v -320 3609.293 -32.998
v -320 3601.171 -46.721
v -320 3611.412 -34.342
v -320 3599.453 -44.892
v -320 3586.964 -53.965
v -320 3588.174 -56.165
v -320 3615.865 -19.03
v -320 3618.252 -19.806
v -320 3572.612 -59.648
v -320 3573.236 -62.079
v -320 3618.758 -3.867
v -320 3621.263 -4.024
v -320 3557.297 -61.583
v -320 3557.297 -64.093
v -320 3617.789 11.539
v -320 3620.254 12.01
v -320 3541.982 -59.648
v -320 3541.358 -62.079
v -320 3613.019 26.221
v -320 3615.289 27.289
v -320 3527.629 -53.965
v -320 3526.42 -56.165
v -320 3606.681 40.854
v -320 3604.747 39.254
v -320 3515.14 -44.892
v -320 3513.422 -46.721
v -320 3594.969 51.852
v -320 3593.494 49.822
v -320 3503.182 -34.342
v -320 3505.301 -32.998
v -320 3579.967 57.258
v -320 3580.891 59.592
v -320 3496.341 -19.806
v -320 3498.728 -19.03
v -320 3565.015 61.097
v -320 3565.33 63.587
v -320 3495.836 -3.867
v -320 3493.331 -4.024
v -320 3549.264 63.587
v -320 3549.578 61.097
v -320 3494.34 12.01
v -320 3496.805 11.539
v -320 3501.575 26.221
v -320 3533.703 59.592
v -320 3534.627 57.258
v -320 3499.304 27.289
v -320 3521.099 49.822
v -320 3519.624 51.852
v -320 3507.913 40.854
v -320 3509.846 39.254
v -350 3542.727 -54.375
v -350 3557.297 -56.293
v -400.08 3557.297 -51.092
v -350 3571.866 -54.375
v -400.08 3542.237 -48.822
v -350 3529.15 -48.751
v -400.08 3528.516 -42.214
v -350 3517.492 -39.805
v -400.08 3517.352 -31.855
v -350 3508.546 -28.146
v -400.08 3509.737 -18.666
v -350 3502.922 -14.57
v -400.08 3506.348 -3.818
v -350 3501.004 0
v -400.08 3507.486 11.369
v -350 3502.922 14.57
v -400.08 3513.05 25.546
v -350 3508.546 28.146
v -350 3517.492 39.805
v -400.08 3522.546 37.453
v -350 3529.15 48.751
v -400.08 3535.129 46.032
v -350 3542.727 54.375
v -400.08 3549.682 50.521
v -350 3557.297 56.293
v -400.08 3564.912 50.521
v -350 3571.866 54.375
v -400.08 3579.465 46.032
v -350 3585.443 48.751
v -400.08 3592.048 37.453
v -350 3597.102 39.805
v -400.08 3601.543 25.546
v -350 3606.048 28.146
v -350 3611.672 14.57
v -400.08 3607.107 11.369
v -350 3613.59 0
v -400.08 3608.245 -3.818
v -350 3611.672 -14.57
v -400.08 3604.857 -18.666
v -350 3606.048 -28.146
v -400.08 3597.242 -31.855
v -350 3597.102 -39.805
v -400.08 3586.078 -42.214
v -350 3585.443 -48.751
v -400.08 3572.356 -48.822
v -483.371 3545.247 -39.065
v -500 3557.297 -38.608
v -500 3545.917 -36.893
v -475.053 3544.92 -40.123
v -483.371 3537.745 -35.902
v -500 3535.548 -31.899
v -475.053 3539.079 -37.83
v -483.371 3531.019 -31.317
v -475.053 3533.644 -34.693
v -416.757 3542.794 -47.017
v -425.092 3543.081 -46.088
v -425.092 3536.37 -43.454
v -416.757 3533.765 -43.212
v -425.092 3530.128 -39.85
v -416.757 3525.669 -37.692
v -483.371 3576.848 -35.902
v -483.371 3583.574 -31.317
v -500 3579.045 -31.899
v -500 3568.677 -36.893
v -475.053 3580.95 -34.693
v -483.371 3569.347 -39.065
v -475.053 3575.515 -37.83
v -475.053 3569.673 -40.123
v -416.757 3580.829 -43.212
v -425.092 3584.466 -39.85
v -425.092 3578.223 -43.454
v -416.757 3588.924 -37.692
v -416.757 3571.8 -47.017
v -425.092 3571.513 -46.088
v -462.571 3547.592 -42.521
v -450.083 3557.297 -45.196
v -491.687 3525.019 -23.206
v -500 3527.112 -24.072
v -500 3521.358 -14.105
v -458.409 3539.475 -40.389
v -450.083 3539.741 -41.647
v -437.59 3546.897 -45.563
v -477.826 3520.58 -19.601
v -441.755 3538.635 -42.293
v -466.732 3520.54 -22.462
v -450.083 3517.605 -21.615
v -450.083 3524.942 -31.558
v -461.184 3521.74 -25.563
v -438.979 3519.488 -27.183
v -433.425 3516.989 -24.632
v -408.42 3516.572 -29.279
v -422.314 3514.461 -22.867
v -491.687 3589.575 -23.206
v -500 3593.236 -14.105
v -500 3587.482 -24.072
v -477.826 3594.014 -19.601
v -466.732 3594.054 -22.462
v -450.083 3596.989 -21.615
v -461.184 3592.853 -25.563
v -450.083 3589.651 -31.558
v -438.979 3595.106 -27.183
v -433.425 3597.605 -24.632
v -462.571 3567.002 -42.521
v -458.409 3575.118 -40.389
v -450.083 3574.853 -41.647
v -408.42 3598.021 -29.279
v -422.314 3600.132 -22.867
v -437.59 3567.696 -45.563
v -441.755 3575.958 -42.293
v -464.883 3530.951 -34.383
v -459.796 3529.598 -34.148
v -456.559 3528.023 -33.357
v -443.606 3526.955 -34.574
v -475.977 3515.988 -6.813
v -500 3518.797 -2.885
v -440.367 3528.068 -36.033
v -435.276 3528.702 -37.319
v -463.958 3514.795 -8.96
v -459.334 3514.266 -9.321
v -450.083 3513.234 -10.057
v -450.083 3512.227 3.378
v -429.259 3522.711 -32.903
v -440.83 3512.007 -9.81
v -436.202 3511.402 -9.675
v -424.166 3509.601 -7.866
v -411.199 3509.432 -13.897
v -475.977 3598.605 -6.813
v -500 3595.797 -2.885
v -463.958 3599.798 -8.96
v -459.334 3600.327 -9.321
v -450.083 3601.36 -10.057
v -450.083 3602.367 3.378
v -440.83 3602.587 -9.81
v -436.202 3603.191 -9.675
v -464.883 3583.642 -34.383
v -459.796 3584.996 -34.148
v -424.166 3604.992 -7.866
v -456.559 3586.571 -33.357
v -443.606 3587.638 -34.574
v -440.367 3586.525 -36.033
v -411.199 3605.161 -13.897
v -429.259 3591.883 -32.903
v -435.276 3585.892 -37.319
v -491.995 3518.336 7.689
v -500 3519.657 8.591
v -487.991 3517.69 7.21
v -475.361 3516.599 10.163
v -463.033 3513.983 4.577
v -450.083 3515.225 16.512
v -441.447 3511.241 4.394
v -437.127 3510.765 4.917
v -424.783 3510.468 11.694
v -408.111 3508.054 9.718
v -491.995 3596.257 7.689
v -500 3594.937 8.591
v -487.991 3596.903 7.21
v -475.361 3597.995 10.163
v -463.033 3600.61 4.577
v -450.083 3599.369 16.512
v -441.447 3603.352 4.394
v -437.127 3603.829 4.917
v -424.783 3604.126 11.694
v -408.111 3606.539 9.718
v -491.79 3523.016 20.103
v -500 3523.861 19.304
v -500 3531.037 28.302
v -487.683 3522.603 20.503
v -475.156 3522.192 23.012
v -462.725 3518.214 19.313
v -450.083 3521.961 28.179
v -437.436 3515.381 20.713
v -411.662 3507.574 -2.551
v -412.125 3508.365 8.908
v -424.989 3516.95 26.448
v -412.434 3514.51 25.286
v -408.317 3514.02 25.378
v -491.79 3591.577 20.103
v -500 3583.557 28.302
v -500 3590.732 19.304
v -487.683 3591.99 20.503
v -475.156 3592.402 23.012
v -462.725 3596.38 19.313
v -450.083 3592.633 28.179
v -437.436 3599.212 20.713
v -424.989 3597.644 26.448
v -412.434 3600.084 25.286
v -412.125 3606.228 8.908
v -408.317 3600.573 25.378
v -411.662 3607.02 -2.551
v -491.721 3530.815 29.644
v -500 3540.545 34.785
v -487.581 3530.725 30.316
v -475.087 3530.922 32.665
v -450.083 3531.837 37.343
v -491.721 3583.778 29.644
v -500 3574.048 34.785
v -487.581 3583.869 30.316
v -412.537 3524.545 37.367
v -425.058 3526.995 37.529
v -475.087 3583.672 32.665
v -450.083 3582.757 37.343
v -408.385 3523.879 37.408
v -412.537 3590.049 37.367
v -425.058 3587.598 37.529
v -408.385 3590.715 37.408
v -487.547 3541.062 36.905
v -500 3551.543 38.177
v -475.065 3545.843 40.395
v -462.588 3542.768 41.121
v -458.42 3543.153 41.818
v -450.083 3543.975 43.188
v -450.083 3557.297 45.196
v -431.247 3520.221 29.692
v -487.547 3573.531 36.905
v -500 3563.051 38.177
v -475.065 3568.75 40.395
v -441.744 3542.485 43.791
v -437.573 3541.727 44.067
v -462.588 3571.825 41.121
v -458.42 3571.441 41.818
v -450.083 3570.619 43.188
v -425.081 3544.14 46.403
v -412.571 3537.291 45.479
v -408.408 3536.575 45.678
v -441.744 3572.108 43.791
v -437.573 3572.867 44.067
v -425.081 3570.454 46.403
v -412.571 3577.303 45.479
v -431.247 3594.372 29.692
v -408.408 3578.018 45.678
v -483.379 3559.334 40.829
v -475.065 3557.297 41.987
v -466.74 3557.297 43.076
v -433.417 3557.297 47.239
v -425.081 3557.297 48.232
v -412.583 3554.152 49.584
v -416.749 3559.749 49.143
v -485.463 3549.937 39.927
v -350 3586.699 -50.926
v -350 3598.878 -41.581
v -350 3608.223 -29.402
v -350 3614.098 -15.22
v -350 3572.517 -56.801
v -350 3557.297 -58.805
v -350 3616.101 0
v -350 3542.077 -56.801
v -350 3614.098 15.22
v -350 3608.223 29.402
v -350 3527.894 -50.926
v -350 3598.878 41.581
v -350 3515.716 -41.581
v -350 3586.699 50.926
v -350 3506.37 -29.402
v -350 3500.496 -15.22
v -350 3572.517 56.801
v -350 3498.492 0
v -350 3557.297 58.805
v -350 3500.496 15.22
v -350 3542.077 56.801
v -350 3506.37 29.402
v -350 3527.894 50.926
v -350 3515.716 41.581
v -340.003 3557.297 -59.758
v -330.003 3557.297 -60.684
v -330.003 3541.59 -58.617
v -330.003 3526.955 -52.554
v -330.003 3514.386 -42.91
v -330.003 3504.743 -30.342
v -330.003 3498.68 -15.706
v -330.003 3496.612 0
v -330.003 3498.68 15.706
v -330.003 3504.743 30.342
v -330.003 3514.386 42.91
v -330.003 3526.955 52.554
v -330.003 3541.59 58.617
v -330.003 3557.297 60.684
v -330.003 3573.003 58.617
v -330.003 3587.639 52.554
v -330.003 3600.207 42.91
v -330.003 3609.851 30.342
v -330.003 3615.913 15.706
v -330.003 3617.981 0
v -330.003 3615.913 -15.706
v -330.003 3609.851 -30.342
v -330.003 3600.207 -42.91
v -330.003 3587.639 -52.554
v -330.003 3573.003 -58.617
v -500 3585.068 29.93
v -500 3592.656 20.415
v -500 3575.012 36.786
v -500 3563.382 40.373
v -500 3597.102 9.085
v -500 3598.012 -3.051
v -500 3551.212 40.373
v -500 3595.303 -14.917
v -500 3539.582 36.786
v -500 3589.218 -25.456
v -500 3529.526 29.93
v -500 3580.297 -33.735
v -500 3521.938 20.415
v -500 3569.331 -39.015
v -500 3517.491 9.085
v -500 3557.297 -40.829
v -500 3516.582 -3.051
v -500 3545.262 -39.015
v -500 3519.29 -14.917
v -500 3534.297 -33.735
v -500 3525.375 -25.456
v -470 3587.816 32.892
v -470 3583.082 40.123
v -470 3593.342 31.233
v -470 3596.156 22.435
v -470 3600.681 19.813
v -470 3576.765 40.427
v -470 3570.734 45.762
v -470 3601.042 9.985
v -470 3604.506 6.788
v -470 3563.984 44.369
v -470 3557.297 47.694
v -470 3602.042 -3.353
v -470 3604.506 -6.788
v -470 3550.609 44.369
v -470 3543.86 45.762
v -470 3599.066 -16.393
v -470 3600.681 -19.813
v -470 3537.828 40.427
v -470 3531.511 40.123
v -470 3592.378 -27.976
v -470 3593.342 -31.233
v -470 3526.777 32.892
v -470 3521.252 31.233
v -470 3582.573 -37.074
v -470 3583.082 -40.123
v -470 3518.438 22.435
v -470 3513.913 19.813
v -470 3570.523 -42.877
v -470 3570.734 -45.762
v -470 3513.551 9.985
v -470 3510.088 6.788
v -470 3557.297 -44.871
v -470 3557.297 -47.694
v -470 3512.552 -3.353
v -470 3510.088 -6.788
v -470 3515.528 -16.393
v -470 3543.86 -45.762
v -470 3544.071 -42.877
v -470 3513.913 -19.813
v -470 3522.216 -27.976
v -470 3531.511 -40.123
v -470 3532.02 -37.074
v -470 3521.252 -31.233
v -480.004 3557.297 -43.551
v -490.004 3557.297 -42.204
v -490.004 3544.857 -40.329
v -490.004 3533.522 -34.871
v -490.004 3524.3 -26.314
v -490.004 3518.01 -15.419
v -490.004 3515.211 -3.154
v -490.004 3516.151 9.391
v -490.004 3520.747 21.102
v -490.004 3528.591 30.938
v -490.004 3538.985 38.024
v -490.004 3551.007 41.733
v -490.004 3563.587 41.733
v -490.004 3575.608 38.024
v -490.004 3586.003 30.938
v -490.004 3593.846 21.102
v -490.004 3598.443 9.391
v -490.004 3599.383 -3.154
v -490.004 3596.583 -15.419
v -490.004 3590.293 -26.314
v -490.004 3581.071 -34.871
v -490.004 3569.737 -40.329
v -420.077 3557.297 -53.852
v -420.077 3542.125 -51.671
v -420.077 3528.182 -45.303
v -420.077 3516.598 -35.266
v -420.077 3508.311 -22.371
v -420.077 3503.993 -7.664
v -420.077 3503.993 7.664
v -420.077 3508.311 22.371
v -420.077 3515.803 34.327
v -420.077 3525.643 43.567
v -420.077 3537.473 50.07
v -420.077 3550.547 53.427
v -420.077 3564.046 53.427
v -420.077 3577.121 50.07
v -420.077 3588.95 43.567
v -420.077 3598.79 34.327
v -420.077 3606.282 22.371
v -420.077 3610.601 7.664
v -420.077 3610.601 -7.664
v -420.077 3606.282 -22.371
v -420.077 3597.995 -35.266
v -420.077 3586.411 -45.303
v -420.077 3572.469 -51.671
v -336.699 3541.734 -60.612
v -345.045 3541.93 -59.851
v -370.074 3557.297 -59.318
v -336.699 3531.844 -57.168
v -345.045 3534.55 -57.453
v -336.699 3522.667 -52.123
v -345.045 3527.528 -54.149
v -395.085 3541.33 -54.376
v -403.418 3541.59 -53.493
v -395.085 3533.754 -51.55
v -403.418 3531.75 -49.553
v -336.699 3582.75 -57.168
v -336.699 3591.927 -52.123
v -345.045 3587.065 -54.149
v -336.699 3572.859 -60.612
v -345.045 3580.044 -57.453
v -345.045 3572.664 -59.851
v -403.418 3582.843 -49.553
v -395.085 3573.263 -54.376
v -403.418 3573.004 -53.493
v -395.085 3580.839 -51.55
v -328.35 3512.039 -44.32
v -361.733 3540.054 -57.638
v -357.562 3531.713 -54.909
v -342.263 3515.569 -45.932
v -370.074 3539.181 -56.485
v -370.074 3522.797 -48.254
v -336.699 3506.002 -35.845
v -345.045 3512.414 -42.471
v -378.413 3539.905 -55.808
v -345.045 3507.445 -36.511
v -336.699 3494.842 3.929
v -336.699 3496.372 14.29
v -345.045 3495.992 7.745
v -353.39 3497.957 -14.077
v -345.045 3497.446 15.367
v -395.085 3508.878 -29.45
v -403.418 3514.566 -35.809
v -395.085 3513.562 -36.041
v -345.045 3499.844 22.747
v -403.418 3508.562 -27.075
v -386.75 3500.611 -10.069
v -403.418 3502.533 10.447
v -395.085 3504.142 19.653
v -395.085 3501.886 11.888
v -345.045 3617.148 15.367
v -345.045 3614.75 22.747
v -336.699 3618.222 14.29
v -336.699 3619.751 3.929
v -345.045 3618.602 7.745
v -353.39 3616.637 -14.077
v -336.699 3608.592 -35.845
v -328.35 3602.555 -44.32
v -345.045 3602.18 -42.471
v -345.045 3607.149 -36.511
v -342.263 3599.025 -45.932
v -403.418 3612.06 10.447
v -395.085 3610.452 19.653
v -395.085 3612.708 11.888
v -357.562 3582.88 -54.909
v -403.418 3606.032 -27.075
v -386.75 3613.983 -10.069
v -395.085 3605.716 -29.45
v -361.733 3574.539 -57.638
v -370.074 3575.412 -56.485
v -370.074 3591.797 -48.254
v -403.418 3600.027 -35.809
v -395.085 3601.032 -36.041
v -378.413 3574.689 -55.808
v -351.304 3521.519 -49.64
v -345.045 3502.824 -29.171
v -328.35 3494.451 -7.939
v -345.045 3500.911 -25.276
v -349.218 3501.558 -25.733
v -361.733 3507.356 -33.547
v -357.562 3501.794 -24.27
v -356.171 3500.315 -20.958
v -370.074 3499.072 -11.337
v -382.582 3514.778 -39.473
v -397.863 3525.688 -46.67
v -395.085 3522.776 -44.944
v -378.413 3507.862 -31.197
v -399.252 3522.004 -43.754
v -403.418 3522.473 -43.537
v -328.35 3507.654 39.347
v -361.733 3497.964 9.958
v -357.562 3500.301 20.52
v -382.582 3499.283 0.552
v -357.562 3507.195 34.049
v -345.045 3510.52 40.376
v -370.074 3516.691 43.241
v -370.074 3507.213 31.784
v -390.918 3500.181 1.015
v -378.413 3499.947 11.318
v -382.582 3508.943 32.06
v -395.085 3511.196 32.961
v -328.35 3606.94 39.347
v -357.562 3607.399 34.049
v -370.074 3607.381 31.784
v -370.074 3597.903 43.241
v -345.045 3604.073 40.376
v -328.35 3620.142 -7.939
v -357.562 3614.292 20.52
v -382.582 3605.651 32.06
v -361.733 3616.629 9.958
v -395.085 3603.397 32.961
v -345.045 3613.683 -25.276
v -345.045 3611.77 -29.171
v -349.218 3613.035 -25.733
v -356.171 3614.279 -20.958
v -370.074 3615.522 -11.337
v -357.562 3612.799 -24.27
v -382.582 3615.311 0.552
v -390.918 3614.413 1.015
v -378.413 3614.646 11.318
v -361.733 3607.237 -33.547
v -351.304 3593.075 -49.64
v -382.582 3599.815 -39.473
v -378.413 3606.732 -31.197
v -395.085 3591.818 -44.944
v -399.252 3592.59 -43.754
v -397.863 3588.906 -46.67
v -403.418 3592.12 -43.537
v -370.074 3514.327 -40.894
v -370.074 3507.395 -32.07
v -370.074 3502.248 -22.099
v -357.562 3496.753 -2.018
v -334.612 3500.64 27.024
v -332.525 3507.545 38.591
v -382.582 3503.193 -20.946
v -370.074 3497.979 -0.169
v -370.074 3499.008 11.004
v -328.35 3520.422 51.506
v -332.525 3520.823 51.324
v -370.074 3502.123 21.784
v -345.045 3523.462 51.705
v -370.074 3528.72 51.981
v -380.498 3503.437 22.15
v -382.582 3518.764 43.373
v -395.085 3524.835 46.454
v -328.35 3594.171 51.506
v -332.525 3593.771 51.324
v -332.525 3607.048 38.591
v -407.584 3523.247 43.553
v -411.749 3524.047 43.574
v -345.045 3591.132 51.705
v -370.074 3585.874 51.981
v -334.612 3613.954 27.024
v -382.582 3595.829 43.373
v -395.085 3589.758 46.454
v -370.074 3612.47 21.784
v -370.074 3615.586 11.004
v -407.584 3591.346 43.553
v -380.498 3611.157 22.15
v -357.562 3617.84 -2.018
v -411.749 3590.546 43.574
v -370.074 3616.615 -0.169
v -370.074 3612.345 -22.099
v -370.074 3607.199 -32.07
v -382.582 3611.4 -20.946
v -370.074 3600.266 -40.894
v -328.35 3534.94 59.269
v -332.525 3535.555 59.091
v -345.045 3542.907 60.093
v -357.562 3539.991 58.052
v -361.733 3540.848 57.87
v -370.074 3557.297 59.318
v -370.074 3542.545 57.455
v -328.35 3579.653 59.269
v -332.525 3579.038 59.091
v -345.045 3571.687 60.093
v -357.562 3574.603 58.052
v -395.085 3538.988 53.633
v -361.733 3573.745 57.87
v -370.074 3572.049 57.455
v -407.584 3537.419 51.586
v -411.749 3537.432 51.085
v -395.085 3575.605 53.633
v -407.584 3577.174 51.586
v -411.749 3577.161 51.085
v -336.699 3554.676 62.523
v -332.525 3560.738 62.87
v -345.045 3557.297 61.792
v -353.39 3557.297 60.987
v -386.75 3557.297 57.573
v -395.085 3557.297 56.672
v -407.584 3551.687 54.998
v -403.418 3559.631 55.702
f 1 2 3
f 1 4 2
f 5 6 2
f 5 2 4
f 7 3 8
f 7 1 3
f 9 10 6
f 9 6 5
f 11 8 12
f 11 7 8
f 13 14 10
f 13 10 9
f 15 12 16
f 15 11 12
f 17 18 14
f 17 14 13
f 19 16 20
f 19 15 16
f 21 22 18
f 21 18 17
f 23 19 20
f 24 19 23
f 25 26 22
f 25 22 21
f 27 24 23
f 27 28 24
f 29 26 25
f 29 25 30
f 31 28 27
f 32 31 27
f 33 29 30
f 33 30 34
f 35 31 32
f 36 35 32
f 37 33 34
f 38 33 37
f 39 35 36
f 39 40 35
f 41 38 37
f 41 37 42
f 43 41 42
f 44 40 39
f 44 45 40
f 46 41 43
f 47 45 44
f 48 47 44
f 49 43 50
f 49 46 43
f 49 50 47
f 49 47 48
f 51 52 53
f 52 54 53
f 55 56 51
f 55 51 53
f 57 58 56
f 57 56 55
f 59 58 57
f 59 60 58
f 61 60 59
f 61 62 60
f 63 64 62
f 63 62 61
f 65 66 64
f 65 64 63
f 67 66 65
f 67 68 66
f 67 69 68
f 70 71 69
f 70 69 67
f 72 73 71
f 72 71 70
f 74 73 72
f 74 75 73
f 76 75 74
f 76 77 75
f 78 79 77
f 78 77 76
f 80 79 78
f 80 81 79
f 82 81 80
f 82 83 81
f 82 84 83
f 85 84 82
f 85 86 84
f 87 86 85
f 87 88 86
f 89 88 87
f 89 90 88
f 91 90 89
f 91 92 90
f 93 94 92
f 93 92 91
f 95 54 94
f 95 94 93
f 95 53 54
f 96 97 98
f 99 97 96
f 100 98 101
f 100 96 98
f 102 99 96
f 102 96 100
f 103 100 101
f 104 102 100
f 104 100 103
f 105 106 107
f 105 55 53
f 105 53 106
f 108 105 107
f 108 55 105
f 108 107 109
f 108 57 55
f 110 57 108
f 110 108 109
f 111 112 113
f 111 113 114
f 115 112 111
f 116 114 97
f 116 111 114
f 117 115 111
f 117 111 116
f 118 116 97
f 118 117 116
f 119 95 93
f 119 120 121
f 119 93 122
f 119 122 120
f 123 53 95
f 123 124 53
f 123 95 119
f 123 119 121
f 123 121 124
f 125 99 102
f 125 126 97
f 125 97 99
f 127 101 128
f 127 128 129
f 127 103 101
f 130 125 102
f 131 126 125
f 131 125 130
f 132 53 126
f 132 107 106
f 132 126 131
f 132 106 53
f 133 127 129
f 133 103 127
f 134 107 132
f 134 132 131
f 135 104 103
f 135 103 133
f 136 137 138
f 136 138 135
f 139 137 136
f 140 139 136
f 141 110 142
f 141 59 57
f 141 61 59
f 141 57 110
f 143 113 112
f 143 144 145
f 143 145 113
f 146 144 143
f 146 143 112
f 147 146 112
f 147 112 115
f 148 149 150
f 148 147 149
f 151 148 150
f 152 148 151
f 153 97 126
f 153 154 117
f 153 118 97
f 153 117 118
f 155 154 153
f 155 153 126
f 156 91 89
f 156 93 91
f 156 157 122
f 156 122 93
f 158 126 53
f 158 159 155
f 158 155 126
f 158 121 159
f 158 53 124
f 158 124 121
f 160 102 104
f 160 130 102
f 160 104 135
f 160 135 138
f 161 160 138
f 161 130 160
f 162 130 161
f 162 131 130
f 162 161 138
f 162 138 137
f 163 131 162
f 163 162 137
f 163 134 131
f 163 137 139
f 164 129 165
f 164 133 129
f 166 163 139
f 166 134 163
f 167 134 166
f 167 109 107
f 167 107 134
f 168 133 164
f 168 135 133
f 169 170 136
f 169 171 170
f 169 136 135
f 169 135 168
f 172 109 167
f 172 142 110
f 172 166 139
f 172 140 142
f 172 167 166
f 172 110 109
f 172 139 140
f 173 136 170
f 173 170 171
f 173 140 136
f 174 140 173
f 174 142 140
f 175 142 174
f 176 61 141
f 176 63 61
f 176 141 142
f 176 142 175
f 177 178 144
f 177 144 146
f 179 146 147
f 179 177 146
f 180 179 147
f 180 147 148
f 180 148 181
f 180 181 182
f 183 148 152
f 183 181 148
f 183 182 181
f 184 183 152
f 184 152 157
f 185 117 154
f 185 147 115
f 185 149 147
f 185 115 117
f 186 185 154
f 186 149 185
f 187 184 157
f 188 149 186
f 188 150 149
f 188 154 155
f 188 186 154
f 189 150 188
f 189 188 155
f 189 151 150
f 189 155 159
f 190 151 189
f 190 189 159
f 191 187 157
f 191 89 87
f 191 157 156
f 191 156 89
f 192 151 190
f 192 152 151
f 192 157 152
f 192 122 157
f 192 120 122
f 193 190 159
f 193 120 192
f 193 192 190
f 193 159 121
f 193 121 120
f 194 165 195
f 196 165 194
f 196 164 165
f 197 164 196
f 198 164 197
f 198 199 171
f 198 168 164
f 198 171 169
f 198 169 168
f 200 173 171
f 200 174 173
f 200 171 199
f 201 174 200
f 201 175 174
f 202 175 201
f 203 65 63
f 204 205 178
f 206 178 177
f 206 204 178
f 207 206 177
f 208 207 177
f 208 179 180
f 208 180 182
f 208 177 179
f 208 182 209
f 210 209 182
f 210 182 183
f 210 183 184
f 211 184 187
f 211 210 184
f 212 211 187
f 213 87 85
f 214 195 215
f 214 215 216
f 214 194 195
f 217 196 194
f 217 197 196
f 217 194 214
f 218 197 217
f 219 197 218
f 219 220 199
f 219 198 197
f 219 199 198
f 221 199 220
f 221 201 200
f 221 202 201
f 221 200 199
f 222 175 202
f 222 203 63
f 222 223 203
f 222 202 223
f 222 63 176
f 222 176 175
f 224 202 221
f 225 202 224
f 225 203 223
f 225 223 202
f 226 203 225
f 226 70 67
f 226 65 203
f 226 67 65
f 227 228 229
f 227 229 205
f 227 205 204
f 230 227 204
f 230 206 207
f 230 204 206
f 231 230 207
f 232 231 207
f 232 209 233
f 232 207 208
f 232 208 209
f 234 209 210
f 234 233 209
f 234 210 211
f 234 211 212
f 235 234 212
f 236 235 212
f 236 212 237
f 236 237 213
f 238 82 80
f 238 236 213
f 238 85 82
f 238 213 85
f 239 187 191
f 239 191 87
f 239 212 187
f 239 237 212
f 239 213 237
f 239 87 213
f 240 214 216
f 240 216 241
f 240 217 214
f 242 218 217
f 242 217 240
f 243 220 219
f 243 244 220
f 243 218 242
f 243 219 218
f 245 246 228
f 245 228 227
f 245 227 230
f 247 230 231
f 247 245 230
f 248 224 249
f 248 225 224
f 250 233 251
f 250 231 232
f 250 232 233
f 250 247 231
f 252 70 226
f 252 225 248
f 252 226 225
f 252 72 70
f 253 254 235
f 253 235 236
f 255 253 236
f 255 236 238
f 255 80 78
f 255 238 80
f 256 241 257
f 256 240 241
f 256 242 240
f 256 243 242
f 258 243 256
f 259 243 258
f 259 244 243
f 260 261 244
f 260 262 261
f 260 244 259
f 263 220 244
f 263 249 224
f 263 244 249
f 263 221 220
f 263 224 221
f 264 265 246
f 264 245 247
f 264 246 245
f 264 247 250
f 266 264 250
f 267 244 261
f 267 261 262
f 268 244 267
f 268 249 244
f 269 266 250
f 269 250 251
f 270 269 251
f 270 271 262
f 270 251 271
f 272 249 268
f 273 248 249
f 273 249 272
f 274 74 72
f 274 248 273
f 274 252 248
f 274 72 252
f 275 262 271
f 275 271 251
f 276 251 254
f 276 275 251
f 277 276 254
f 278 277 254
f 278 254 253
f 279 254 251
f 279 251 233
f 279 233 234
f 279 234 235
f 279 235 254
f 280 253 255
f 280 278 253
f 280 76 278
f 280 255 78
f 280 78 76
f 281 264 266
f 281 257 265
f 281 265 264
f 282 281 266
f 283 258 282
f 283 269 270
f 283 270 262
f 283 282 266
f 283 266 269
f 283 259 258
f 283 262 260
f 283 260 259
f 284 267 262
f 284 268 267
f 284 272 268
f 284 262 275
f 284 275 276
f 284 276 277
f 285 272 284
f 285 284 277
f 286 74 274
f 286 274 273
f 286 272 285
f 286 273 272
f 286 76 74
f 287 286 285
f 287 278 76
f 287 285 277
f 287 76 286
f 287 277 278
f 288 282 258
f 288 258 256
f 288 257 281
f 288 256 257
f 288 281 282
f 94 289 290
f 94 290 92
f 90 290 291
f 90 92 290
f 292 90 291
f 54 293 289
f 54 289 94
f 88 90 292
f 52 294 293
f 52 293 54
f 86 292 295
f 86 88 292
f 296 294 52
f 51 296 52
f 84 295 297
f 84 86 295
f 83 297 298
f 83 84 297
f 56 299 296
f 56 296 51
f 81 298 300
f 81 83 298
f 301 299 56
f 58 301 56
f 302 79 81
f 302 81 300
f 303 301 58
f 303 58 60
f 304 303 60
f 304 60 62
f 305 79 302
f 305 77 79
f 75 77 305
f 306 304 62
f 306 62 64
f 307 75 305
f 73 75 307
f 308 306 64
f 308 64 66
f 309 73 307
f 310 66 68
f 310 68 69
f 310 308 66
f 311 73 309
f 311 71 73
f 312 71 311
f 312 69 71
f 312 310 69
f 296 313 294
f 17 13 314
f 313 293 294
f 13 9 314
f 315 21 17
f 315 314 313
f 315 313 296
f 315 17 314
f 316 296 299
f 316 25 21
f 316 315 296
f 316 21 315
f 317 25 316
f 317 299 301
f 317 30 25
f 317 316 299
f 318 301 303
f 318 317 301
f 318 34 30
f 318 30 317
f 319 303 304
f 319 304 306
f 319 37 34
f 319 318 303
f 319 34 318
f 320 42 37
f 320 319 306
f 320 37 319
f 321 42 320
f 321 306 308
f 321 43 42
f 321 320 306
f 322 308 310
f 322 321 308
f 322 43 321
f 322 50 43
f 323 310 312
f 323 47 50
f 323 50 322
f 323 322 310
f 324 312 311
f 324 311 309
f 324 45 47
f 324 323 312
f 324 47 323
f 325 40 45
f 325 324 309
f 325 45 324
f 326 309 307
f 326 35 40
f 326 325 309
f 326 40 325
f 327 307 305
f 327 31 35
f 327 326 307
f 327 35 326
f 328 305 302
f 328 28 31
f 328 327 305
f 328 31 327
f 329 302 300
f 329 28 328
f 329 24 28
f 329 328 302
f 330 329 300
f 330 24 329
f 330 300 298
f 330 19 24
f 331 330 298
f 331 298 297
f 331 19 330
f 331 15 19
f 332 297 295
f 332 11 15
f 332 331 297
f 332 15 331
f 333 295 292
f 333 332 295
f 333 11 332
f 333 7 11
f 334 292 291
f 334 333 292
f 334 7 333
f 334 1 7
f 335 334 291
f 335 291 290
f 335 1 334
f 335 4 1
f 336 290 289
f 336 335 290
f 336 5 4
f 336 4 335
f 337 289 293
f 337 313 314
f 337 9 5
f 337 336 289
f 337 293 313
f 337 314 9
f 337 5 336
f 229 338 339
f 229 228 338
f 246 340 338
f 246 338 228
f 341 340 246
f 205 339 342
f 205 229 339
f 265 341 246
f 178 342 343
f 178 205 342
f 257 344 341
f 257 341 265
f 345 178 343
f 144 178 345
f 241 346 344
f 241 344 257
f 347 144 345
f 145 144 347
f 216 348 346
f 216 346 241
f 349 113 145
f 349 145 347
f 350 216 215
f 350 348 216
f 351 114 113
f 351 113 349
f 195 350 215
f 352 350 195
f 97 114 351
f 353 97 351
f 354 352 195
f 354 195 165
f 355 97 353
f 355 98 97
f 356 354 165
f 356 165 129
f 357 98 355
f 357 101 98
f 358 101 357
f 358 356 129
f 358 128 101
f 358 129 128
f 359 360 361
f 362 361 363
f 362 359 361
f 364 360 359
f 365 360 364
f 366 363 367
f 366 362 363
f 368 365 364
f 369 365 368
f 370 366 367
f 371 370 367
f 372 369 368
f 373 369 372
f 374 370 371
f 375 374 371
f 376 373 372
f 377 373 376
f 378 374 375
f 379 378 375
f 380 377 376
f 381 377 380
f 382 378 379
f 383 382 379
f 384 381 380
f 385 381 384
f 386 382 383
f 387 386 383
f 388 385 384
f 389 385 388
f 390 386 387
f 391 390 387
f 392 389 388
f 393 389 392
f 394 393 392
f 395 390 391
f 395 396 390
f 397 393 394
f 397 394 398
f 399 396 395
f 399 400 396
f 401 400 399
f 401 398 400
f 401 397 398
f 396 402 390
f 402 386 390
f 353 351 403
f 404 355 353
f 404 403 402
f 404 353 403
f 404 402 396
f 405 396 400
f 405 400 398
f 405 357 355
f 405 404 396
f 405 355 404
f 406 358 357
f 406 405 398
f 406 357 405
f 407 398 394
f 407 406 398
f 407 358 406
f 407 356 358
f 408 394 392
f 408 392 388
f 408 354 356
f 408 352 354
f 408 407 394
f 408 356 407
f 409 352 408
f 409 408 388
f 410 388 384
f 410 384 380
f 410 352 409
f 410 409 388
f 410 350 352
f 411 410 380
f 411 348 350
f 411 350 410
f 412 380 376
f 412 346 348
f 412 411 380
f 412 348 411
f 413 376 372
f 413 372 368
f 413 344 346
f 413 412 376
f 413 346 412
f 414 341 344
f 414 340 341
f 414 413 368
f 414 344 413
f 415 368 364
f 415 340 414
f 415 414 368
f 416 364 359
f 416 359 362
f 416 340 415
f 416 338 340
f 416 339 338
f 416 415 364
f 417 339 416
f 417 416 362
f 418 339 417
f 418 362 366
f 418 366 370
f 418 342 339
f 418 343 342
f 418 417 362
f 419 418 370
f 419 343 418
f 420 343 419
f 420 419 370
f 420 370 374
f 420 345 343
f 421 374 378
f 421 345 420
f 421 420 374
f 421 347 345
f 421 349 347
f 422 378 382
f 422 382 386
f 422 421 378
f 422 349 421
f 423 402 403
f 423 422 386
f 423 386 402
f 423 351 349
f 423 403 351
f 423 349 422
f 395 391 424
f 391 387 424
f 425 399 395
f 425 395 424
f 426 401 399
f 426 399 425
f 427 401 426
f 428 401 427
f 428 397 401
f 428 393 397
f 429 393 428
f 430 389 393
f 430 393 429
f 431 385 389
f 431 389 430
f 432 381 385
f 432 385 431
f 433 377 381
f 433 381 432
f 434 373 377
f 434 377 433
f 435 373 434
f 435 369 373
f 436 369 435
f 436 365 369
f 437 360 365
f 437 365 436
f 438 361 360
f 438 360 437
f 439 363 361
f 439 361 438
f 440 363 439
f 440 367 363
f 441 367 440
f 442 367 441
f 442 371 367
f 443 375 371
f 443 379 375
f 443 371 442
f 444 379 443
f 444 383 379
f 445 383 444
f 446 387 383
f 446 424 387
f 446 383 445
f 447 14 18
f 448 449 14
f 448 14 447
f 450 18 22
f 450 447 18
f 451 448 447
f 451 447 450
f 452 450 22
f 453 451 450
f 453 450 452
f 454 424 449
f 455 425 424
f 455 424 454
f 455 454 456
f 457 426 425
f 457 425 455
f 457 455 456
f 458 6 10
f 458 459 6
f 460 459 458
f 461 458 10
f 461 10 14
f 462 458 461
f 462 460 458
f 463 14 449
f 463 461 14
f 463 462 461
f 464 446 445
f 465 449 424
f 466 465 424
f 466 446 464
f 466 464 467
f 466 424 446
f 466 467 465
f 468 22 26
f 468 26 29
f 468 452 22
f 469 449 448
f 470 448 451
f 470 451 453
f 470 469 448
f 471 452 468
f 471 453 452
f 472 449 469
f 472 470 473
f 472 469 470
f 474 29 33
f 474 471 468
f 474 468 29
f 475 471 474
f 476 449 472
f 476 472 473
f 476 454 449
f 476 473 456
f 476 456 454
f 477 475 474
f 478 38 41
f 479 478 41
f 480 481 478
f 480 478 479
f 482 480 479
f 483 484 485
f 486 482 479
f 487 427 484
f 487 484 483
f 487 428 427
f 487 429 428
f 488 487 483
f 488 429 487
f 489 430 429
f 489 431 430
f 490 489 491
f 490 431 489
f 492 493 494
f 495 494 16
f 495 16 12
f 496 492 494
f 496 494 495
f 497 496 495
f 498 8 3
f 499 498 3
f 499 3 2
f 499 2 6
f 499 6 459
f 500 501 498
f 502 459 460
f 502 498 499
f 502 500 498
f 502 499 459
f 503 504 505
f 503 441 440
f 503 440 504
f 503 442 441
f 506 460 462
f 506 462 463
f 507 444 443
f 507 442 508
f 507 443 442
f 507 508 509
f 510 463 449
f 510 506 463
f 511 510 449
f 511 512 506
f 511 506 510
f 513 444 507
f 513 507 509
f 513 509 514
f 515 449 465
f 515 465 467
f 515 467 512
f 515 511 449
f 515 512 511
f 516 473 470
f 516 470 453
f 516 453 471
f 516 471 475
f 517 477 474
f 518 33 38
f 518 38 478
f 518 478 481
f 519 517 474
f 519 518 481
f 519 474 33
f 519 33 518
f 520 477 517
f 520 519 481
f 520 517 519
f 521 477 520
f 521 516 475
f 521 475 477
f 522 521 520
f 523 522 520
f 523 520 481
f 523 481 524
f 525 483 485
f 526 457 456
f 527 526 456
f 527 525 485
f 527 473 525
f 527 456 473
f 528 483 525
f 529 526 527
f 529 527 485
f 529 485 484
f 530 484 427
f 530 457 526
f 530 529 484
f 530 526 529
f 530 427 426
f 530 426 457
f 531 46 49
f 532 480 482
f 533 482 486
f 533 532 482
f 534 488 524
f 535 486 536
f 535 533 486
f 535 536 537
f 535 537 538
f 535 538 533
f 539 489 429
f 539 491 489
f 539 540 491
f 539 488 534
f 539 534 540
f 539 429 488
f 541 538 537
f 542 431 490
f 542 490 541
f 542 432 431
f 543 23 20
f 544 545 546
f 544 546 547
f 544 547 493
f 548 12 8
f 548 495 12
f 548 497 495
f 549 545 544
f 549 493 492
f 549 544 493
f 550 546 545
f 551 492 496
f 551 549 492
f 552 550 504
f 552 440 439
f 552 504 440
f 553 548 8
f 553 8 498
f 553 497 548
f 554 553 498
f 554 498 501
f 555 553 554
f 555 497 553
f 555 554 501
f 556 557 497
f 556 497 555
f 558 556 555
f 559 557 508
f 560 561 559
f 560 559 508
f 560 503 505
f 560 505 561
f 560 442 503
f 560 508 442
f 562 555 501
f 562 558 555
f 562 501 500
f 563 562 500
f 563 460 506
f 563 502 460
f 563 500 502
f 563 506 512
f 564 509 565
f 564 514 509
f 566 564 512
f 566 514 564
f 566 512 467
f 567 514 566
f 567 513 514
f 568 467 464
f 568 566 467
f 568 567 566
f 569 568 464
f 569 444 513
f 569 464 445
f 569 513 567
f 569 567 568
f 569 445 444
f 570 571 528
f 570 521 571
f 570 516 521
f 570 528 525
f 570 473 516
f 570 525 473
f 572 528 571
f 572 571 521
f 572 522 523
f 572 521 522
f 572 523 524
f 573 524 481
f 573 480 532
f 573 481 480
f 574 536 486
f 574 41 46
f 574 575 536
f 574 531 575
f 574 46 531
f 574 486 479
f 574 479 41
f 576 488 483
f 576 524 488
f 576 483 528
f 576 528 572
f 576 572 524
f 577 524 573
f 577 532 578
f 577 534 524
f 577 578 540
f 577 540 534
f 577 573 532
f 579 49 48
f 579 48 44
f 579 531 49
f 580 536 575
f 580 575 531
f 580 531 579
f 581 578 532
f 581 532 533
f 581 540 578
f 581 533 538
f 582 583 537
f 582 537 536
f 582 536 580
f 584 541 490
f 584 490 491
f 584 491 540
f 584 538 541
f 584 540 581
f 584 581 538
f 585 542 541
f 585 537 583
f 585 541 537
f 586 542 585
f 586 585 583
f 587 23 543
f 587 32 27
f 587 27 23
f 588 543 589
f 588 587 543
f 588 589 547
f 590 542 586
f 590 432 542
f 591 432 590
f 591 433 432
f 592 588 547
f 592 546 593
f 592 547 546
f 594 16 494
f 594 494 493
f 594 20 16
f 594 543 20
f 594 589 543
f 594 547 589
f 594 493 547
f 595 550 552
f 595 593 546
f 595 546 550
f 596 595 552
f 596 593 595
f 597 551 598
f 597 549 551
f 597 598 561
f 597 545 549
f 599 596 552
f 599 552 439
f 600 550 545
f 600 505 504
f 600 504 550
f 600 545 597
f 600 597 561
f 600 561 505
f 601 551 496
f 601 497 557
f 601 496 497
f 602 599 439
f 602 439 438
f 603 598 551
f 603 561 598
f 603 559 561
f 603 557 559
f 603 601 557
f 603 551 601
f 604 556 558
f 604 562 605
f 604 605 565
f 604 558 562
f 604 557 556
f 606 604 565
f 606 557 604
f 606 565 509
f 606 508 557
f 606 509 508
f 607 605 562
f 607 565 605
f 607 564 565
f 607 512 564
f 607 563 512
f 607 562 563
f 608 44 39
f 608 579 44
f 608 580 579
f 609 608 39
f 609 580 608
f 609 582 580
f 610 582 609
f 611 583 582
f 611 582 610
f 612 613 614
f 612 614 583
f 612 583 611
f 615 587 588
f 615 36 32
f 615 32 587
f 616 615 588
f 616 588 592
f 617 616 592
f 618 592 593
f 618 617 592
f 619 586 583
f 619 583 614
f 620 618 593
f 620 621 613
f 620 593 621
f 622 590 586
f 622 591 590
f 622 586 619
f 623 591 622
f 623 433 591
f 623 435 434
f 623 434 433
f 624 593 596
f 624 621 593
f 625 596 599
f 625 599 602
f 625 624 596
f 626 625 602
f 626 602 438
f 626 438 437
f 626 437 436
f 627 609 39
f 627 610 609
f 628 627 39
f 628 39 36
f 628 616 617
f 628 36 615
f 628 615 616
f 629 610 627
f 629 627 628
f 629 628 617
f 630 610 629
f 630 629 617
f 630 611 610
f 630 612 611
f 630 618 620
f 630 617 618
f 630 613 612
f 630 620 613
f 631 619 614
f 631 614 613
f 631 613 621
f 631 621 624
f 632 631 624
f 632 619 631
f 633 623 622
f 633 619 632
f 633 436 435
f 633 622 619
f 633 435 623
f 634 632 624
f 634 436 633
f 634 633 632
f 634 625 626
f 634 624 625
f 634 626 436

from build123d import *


with BuildPart() as part:
    # Sketch1 → Revolve1 (revolve)
    with BuildSketch(Plane.XY, mode=Mode.PRIVATE) as revolve1_sk:
        with BuildLine():
            Line((-320, 3618.879522725), (-320, 3621.389270708))
            ThreePointArc((-320, 3621.389270708), (-395.085086609, 3613.968459234), (-470, 3604.991019406))
            Line((-470, 3604.991019406), (-470, 3602.469847202))
            Line((-470, 3602.469847202), (-470, 3602.167304554))
            ThreePointArc((-470, 3602.167304554), (-485.004209708, 3600.177802077), (-499.999999999, 3598.125802414))
            Line((-499.999999999, 3598.125802414), (-499.999999999, 3595.904649737))
            ThreePointArc((-499.999999999, 3595.904649737), (-425.091978188, 3605.527292932), (-350, 3613.589662649))
            Line((-350, 3613.589662649), (-350, 3615.799951601))
            Line((-350, 3615.799951601), (-350, 3616.101353668))
            ThreePointArc((-350, 3616.101353668), (-335.002879921, 3617.52153697), (-320, 3618.879522725))
        make_face()
    revolve(revolve1_sk.sketch.rotate(Axis((0, 3557.296761587, 0), (-1, 0, 0)), 90), axis=Axis((0, 3557.296761587, 0), (-1, 0, 0)))


solid = part.part
